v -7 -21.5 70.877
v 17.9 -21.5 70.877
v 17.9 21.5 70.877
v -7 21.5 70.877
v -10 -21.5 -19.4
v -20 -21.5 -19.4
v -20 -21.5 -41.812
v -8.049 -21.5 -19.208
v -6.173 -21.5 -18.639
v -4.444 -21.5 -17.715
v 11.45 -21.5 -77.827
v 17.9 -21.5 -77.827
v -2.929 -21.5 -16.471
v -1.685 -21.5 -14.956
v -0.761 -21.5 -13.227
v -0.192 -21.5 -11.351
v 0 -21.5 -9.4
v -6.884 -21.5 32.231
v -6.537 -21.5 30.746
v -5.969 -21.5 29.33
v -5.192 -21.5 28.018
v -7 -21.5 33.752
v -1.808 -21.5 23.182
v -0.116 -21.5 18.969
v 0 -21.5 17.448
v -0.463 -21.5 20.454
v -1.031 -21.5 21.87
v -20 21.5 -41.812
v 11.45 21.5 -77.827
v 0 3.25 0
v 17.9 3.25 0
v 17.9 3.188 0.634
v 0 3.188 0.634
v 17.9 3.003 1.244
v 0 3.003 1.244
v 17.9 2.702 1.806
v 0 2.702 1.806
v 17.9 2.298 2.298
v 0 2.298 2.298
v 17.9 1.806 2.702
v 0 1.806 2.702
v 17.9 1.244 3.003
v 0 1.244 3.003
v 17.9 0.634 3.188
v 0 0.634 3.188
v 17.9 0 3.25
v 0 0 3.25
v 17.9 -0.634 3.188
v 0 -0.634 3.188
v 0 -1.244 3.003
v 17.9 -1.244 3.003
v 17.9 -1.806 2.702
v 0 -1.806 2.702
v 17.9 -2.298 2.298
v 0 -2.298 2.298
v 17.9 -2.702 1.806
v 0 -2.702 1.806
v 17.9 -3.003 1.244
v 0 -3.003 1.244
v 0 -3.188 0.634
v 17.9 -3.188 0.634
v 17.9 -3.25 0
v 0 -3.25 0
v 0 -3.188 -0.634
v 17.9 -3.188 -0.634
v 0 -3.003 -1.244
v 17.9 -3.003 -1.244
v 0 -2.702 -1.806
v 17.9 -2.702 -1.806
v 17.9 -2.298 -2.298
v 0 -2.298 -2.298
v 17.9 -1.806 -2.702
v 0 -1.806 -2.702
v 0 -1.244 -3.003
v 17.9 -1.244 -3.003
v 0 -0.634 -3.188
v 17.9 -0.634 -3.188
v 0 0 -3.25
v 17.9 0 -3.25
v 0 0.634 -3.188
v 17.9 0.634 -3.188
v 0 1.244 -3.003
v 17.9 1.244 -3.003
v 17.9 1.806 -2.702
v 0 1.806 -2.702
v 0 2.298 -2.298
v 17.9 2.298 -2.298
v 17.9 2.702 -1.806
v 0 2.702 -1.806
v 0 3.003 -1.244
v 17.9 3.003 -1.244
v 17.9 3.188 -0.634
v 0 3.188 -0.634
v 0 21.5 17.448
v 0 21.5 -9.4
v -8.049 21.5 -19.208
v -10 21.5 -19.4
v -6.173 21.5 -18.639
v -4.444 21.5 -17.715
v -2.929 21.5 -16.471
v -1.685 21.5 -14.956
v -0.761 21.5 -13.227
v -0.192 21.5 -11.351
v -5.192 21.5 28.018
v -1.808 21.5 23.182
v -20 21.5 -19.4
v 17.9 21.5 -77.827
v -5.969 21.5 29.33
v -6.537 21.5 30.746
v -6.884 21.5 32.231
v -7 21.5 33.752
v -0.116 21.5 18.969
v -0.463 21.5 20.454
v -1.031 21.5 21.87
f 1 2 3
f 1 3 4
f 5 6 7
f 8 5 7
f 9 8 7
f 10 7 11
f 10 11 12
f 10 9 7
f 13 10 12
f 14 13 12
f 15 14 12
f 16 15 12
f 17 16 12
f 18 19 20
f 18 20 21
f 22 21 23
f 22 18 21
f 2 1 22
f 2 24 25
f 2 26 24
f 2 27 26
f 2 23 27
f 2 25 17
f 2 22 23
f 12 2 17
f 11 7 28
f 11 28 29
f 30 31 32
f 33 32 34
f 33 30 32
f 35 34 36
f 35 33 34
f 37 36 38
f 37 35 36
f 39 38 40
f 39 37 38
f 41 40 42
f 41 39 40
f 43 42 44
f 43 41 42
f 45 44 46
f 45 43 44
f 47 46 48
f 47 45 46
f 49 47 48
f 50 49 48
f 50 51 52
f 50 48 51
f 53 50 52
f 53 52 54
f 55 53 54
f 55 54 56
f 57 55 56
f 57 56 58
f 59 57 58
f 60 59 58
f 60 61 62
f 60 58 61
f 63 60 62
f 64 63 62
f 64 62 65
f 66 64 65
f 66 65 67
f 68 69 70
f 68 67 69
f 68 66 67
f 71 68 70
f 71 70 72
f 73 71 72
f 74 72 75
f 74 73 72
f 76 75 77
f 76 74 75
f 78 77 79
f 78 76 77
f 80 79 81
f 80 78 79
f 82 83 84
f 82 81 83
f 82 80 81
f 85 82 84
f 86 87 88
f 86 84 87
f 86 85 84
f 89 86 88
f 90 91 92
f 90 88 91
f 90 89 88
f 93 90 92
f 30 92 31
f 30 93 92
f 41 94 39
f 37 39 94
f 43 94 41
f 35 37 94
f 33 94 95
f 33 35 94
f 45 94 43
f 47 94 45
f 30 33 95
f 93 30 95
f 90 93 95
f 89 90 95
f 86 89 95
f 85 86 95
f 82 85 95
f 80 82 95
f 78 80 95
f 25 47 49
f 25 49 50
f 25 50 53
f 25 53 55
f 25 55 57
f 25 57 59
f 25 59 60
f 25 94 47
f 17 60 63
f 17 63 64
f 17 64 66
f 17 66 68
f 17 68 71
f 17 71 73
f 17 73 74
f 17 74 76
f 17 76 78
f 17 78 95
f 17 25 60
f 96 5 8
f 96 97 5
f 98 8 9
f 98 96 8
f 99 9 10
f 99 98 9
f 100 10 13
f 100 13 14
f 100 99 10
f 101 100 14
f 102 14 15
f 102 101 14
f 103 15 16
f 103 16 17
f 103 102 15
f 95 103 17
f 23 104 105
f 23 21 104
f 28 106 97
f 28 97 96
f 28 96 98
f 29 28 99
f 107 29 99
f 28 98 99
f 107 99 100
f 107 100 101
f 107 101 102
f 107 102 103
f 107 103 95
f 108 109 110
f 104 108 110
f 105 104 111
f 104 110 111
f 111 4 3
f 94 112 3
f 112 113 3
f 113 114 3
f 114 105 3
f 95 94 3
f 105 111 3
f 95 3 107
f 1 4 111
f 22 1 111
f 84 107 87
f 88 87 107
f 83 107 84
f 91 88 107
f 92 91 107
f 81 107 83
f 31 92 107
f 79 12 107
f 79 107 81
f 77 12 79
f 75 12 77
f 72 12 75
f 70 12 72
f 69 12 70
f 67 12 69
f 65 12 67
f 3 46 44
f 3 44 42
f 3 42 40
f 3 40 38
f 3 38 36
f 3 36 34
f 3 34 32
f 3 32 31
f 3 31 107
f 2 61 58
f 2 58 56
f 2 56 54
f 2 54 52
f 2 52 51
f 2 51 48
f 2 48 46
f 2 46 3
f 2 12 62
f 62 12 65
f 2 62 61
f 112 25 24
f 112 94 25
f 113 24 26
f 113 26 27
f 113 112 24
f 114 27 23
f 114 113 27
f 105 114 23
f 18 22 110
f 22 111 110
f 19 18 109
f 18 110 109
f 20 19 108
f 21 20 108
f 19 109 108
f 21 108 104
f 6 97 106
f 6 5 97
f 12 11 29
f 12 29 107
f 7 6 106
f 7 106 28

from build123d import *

# Parameters (mm, degrees)
F1_DEPTH = 21.5
F2_R     = 3.25
F3_DEPTH = 17.901
F4_R     = 10


with BuildPart() as f1:
    # F0 (on Front) → F1 (new body, symmetric)
    with BuildSketch(Plane.XZ):
        Polygon((0, -19.4), (-20, -19.4), (-20, -41.812051613), (11.4499329693, -77.827301579), (17.9, -77.827301579), (17.9, 70.8765028308), (-7, 70.8765028308), (-7, 30.6), (0, 20.6), align=None)
    extrude(amount=F1_DEPTH, both=True)

    # F2 (on Right) → F3 (cut, through all)
    with BuildSketch(Plane.YZ):
        Circle(F2_R)
    extrude(amount=F3_DEPTH, mode=Mode.SUBTRACT)

    # F4
    f4_edges = [f1.edges().sort_by_distance(p)[0] for p in [
        (0, 0, -19.4),
        (0, 0, 20.6),
        (-7, 0, 30.6),
    ]]
    fillet(f4_edges, radius=F4_R)


solid = f1.part
